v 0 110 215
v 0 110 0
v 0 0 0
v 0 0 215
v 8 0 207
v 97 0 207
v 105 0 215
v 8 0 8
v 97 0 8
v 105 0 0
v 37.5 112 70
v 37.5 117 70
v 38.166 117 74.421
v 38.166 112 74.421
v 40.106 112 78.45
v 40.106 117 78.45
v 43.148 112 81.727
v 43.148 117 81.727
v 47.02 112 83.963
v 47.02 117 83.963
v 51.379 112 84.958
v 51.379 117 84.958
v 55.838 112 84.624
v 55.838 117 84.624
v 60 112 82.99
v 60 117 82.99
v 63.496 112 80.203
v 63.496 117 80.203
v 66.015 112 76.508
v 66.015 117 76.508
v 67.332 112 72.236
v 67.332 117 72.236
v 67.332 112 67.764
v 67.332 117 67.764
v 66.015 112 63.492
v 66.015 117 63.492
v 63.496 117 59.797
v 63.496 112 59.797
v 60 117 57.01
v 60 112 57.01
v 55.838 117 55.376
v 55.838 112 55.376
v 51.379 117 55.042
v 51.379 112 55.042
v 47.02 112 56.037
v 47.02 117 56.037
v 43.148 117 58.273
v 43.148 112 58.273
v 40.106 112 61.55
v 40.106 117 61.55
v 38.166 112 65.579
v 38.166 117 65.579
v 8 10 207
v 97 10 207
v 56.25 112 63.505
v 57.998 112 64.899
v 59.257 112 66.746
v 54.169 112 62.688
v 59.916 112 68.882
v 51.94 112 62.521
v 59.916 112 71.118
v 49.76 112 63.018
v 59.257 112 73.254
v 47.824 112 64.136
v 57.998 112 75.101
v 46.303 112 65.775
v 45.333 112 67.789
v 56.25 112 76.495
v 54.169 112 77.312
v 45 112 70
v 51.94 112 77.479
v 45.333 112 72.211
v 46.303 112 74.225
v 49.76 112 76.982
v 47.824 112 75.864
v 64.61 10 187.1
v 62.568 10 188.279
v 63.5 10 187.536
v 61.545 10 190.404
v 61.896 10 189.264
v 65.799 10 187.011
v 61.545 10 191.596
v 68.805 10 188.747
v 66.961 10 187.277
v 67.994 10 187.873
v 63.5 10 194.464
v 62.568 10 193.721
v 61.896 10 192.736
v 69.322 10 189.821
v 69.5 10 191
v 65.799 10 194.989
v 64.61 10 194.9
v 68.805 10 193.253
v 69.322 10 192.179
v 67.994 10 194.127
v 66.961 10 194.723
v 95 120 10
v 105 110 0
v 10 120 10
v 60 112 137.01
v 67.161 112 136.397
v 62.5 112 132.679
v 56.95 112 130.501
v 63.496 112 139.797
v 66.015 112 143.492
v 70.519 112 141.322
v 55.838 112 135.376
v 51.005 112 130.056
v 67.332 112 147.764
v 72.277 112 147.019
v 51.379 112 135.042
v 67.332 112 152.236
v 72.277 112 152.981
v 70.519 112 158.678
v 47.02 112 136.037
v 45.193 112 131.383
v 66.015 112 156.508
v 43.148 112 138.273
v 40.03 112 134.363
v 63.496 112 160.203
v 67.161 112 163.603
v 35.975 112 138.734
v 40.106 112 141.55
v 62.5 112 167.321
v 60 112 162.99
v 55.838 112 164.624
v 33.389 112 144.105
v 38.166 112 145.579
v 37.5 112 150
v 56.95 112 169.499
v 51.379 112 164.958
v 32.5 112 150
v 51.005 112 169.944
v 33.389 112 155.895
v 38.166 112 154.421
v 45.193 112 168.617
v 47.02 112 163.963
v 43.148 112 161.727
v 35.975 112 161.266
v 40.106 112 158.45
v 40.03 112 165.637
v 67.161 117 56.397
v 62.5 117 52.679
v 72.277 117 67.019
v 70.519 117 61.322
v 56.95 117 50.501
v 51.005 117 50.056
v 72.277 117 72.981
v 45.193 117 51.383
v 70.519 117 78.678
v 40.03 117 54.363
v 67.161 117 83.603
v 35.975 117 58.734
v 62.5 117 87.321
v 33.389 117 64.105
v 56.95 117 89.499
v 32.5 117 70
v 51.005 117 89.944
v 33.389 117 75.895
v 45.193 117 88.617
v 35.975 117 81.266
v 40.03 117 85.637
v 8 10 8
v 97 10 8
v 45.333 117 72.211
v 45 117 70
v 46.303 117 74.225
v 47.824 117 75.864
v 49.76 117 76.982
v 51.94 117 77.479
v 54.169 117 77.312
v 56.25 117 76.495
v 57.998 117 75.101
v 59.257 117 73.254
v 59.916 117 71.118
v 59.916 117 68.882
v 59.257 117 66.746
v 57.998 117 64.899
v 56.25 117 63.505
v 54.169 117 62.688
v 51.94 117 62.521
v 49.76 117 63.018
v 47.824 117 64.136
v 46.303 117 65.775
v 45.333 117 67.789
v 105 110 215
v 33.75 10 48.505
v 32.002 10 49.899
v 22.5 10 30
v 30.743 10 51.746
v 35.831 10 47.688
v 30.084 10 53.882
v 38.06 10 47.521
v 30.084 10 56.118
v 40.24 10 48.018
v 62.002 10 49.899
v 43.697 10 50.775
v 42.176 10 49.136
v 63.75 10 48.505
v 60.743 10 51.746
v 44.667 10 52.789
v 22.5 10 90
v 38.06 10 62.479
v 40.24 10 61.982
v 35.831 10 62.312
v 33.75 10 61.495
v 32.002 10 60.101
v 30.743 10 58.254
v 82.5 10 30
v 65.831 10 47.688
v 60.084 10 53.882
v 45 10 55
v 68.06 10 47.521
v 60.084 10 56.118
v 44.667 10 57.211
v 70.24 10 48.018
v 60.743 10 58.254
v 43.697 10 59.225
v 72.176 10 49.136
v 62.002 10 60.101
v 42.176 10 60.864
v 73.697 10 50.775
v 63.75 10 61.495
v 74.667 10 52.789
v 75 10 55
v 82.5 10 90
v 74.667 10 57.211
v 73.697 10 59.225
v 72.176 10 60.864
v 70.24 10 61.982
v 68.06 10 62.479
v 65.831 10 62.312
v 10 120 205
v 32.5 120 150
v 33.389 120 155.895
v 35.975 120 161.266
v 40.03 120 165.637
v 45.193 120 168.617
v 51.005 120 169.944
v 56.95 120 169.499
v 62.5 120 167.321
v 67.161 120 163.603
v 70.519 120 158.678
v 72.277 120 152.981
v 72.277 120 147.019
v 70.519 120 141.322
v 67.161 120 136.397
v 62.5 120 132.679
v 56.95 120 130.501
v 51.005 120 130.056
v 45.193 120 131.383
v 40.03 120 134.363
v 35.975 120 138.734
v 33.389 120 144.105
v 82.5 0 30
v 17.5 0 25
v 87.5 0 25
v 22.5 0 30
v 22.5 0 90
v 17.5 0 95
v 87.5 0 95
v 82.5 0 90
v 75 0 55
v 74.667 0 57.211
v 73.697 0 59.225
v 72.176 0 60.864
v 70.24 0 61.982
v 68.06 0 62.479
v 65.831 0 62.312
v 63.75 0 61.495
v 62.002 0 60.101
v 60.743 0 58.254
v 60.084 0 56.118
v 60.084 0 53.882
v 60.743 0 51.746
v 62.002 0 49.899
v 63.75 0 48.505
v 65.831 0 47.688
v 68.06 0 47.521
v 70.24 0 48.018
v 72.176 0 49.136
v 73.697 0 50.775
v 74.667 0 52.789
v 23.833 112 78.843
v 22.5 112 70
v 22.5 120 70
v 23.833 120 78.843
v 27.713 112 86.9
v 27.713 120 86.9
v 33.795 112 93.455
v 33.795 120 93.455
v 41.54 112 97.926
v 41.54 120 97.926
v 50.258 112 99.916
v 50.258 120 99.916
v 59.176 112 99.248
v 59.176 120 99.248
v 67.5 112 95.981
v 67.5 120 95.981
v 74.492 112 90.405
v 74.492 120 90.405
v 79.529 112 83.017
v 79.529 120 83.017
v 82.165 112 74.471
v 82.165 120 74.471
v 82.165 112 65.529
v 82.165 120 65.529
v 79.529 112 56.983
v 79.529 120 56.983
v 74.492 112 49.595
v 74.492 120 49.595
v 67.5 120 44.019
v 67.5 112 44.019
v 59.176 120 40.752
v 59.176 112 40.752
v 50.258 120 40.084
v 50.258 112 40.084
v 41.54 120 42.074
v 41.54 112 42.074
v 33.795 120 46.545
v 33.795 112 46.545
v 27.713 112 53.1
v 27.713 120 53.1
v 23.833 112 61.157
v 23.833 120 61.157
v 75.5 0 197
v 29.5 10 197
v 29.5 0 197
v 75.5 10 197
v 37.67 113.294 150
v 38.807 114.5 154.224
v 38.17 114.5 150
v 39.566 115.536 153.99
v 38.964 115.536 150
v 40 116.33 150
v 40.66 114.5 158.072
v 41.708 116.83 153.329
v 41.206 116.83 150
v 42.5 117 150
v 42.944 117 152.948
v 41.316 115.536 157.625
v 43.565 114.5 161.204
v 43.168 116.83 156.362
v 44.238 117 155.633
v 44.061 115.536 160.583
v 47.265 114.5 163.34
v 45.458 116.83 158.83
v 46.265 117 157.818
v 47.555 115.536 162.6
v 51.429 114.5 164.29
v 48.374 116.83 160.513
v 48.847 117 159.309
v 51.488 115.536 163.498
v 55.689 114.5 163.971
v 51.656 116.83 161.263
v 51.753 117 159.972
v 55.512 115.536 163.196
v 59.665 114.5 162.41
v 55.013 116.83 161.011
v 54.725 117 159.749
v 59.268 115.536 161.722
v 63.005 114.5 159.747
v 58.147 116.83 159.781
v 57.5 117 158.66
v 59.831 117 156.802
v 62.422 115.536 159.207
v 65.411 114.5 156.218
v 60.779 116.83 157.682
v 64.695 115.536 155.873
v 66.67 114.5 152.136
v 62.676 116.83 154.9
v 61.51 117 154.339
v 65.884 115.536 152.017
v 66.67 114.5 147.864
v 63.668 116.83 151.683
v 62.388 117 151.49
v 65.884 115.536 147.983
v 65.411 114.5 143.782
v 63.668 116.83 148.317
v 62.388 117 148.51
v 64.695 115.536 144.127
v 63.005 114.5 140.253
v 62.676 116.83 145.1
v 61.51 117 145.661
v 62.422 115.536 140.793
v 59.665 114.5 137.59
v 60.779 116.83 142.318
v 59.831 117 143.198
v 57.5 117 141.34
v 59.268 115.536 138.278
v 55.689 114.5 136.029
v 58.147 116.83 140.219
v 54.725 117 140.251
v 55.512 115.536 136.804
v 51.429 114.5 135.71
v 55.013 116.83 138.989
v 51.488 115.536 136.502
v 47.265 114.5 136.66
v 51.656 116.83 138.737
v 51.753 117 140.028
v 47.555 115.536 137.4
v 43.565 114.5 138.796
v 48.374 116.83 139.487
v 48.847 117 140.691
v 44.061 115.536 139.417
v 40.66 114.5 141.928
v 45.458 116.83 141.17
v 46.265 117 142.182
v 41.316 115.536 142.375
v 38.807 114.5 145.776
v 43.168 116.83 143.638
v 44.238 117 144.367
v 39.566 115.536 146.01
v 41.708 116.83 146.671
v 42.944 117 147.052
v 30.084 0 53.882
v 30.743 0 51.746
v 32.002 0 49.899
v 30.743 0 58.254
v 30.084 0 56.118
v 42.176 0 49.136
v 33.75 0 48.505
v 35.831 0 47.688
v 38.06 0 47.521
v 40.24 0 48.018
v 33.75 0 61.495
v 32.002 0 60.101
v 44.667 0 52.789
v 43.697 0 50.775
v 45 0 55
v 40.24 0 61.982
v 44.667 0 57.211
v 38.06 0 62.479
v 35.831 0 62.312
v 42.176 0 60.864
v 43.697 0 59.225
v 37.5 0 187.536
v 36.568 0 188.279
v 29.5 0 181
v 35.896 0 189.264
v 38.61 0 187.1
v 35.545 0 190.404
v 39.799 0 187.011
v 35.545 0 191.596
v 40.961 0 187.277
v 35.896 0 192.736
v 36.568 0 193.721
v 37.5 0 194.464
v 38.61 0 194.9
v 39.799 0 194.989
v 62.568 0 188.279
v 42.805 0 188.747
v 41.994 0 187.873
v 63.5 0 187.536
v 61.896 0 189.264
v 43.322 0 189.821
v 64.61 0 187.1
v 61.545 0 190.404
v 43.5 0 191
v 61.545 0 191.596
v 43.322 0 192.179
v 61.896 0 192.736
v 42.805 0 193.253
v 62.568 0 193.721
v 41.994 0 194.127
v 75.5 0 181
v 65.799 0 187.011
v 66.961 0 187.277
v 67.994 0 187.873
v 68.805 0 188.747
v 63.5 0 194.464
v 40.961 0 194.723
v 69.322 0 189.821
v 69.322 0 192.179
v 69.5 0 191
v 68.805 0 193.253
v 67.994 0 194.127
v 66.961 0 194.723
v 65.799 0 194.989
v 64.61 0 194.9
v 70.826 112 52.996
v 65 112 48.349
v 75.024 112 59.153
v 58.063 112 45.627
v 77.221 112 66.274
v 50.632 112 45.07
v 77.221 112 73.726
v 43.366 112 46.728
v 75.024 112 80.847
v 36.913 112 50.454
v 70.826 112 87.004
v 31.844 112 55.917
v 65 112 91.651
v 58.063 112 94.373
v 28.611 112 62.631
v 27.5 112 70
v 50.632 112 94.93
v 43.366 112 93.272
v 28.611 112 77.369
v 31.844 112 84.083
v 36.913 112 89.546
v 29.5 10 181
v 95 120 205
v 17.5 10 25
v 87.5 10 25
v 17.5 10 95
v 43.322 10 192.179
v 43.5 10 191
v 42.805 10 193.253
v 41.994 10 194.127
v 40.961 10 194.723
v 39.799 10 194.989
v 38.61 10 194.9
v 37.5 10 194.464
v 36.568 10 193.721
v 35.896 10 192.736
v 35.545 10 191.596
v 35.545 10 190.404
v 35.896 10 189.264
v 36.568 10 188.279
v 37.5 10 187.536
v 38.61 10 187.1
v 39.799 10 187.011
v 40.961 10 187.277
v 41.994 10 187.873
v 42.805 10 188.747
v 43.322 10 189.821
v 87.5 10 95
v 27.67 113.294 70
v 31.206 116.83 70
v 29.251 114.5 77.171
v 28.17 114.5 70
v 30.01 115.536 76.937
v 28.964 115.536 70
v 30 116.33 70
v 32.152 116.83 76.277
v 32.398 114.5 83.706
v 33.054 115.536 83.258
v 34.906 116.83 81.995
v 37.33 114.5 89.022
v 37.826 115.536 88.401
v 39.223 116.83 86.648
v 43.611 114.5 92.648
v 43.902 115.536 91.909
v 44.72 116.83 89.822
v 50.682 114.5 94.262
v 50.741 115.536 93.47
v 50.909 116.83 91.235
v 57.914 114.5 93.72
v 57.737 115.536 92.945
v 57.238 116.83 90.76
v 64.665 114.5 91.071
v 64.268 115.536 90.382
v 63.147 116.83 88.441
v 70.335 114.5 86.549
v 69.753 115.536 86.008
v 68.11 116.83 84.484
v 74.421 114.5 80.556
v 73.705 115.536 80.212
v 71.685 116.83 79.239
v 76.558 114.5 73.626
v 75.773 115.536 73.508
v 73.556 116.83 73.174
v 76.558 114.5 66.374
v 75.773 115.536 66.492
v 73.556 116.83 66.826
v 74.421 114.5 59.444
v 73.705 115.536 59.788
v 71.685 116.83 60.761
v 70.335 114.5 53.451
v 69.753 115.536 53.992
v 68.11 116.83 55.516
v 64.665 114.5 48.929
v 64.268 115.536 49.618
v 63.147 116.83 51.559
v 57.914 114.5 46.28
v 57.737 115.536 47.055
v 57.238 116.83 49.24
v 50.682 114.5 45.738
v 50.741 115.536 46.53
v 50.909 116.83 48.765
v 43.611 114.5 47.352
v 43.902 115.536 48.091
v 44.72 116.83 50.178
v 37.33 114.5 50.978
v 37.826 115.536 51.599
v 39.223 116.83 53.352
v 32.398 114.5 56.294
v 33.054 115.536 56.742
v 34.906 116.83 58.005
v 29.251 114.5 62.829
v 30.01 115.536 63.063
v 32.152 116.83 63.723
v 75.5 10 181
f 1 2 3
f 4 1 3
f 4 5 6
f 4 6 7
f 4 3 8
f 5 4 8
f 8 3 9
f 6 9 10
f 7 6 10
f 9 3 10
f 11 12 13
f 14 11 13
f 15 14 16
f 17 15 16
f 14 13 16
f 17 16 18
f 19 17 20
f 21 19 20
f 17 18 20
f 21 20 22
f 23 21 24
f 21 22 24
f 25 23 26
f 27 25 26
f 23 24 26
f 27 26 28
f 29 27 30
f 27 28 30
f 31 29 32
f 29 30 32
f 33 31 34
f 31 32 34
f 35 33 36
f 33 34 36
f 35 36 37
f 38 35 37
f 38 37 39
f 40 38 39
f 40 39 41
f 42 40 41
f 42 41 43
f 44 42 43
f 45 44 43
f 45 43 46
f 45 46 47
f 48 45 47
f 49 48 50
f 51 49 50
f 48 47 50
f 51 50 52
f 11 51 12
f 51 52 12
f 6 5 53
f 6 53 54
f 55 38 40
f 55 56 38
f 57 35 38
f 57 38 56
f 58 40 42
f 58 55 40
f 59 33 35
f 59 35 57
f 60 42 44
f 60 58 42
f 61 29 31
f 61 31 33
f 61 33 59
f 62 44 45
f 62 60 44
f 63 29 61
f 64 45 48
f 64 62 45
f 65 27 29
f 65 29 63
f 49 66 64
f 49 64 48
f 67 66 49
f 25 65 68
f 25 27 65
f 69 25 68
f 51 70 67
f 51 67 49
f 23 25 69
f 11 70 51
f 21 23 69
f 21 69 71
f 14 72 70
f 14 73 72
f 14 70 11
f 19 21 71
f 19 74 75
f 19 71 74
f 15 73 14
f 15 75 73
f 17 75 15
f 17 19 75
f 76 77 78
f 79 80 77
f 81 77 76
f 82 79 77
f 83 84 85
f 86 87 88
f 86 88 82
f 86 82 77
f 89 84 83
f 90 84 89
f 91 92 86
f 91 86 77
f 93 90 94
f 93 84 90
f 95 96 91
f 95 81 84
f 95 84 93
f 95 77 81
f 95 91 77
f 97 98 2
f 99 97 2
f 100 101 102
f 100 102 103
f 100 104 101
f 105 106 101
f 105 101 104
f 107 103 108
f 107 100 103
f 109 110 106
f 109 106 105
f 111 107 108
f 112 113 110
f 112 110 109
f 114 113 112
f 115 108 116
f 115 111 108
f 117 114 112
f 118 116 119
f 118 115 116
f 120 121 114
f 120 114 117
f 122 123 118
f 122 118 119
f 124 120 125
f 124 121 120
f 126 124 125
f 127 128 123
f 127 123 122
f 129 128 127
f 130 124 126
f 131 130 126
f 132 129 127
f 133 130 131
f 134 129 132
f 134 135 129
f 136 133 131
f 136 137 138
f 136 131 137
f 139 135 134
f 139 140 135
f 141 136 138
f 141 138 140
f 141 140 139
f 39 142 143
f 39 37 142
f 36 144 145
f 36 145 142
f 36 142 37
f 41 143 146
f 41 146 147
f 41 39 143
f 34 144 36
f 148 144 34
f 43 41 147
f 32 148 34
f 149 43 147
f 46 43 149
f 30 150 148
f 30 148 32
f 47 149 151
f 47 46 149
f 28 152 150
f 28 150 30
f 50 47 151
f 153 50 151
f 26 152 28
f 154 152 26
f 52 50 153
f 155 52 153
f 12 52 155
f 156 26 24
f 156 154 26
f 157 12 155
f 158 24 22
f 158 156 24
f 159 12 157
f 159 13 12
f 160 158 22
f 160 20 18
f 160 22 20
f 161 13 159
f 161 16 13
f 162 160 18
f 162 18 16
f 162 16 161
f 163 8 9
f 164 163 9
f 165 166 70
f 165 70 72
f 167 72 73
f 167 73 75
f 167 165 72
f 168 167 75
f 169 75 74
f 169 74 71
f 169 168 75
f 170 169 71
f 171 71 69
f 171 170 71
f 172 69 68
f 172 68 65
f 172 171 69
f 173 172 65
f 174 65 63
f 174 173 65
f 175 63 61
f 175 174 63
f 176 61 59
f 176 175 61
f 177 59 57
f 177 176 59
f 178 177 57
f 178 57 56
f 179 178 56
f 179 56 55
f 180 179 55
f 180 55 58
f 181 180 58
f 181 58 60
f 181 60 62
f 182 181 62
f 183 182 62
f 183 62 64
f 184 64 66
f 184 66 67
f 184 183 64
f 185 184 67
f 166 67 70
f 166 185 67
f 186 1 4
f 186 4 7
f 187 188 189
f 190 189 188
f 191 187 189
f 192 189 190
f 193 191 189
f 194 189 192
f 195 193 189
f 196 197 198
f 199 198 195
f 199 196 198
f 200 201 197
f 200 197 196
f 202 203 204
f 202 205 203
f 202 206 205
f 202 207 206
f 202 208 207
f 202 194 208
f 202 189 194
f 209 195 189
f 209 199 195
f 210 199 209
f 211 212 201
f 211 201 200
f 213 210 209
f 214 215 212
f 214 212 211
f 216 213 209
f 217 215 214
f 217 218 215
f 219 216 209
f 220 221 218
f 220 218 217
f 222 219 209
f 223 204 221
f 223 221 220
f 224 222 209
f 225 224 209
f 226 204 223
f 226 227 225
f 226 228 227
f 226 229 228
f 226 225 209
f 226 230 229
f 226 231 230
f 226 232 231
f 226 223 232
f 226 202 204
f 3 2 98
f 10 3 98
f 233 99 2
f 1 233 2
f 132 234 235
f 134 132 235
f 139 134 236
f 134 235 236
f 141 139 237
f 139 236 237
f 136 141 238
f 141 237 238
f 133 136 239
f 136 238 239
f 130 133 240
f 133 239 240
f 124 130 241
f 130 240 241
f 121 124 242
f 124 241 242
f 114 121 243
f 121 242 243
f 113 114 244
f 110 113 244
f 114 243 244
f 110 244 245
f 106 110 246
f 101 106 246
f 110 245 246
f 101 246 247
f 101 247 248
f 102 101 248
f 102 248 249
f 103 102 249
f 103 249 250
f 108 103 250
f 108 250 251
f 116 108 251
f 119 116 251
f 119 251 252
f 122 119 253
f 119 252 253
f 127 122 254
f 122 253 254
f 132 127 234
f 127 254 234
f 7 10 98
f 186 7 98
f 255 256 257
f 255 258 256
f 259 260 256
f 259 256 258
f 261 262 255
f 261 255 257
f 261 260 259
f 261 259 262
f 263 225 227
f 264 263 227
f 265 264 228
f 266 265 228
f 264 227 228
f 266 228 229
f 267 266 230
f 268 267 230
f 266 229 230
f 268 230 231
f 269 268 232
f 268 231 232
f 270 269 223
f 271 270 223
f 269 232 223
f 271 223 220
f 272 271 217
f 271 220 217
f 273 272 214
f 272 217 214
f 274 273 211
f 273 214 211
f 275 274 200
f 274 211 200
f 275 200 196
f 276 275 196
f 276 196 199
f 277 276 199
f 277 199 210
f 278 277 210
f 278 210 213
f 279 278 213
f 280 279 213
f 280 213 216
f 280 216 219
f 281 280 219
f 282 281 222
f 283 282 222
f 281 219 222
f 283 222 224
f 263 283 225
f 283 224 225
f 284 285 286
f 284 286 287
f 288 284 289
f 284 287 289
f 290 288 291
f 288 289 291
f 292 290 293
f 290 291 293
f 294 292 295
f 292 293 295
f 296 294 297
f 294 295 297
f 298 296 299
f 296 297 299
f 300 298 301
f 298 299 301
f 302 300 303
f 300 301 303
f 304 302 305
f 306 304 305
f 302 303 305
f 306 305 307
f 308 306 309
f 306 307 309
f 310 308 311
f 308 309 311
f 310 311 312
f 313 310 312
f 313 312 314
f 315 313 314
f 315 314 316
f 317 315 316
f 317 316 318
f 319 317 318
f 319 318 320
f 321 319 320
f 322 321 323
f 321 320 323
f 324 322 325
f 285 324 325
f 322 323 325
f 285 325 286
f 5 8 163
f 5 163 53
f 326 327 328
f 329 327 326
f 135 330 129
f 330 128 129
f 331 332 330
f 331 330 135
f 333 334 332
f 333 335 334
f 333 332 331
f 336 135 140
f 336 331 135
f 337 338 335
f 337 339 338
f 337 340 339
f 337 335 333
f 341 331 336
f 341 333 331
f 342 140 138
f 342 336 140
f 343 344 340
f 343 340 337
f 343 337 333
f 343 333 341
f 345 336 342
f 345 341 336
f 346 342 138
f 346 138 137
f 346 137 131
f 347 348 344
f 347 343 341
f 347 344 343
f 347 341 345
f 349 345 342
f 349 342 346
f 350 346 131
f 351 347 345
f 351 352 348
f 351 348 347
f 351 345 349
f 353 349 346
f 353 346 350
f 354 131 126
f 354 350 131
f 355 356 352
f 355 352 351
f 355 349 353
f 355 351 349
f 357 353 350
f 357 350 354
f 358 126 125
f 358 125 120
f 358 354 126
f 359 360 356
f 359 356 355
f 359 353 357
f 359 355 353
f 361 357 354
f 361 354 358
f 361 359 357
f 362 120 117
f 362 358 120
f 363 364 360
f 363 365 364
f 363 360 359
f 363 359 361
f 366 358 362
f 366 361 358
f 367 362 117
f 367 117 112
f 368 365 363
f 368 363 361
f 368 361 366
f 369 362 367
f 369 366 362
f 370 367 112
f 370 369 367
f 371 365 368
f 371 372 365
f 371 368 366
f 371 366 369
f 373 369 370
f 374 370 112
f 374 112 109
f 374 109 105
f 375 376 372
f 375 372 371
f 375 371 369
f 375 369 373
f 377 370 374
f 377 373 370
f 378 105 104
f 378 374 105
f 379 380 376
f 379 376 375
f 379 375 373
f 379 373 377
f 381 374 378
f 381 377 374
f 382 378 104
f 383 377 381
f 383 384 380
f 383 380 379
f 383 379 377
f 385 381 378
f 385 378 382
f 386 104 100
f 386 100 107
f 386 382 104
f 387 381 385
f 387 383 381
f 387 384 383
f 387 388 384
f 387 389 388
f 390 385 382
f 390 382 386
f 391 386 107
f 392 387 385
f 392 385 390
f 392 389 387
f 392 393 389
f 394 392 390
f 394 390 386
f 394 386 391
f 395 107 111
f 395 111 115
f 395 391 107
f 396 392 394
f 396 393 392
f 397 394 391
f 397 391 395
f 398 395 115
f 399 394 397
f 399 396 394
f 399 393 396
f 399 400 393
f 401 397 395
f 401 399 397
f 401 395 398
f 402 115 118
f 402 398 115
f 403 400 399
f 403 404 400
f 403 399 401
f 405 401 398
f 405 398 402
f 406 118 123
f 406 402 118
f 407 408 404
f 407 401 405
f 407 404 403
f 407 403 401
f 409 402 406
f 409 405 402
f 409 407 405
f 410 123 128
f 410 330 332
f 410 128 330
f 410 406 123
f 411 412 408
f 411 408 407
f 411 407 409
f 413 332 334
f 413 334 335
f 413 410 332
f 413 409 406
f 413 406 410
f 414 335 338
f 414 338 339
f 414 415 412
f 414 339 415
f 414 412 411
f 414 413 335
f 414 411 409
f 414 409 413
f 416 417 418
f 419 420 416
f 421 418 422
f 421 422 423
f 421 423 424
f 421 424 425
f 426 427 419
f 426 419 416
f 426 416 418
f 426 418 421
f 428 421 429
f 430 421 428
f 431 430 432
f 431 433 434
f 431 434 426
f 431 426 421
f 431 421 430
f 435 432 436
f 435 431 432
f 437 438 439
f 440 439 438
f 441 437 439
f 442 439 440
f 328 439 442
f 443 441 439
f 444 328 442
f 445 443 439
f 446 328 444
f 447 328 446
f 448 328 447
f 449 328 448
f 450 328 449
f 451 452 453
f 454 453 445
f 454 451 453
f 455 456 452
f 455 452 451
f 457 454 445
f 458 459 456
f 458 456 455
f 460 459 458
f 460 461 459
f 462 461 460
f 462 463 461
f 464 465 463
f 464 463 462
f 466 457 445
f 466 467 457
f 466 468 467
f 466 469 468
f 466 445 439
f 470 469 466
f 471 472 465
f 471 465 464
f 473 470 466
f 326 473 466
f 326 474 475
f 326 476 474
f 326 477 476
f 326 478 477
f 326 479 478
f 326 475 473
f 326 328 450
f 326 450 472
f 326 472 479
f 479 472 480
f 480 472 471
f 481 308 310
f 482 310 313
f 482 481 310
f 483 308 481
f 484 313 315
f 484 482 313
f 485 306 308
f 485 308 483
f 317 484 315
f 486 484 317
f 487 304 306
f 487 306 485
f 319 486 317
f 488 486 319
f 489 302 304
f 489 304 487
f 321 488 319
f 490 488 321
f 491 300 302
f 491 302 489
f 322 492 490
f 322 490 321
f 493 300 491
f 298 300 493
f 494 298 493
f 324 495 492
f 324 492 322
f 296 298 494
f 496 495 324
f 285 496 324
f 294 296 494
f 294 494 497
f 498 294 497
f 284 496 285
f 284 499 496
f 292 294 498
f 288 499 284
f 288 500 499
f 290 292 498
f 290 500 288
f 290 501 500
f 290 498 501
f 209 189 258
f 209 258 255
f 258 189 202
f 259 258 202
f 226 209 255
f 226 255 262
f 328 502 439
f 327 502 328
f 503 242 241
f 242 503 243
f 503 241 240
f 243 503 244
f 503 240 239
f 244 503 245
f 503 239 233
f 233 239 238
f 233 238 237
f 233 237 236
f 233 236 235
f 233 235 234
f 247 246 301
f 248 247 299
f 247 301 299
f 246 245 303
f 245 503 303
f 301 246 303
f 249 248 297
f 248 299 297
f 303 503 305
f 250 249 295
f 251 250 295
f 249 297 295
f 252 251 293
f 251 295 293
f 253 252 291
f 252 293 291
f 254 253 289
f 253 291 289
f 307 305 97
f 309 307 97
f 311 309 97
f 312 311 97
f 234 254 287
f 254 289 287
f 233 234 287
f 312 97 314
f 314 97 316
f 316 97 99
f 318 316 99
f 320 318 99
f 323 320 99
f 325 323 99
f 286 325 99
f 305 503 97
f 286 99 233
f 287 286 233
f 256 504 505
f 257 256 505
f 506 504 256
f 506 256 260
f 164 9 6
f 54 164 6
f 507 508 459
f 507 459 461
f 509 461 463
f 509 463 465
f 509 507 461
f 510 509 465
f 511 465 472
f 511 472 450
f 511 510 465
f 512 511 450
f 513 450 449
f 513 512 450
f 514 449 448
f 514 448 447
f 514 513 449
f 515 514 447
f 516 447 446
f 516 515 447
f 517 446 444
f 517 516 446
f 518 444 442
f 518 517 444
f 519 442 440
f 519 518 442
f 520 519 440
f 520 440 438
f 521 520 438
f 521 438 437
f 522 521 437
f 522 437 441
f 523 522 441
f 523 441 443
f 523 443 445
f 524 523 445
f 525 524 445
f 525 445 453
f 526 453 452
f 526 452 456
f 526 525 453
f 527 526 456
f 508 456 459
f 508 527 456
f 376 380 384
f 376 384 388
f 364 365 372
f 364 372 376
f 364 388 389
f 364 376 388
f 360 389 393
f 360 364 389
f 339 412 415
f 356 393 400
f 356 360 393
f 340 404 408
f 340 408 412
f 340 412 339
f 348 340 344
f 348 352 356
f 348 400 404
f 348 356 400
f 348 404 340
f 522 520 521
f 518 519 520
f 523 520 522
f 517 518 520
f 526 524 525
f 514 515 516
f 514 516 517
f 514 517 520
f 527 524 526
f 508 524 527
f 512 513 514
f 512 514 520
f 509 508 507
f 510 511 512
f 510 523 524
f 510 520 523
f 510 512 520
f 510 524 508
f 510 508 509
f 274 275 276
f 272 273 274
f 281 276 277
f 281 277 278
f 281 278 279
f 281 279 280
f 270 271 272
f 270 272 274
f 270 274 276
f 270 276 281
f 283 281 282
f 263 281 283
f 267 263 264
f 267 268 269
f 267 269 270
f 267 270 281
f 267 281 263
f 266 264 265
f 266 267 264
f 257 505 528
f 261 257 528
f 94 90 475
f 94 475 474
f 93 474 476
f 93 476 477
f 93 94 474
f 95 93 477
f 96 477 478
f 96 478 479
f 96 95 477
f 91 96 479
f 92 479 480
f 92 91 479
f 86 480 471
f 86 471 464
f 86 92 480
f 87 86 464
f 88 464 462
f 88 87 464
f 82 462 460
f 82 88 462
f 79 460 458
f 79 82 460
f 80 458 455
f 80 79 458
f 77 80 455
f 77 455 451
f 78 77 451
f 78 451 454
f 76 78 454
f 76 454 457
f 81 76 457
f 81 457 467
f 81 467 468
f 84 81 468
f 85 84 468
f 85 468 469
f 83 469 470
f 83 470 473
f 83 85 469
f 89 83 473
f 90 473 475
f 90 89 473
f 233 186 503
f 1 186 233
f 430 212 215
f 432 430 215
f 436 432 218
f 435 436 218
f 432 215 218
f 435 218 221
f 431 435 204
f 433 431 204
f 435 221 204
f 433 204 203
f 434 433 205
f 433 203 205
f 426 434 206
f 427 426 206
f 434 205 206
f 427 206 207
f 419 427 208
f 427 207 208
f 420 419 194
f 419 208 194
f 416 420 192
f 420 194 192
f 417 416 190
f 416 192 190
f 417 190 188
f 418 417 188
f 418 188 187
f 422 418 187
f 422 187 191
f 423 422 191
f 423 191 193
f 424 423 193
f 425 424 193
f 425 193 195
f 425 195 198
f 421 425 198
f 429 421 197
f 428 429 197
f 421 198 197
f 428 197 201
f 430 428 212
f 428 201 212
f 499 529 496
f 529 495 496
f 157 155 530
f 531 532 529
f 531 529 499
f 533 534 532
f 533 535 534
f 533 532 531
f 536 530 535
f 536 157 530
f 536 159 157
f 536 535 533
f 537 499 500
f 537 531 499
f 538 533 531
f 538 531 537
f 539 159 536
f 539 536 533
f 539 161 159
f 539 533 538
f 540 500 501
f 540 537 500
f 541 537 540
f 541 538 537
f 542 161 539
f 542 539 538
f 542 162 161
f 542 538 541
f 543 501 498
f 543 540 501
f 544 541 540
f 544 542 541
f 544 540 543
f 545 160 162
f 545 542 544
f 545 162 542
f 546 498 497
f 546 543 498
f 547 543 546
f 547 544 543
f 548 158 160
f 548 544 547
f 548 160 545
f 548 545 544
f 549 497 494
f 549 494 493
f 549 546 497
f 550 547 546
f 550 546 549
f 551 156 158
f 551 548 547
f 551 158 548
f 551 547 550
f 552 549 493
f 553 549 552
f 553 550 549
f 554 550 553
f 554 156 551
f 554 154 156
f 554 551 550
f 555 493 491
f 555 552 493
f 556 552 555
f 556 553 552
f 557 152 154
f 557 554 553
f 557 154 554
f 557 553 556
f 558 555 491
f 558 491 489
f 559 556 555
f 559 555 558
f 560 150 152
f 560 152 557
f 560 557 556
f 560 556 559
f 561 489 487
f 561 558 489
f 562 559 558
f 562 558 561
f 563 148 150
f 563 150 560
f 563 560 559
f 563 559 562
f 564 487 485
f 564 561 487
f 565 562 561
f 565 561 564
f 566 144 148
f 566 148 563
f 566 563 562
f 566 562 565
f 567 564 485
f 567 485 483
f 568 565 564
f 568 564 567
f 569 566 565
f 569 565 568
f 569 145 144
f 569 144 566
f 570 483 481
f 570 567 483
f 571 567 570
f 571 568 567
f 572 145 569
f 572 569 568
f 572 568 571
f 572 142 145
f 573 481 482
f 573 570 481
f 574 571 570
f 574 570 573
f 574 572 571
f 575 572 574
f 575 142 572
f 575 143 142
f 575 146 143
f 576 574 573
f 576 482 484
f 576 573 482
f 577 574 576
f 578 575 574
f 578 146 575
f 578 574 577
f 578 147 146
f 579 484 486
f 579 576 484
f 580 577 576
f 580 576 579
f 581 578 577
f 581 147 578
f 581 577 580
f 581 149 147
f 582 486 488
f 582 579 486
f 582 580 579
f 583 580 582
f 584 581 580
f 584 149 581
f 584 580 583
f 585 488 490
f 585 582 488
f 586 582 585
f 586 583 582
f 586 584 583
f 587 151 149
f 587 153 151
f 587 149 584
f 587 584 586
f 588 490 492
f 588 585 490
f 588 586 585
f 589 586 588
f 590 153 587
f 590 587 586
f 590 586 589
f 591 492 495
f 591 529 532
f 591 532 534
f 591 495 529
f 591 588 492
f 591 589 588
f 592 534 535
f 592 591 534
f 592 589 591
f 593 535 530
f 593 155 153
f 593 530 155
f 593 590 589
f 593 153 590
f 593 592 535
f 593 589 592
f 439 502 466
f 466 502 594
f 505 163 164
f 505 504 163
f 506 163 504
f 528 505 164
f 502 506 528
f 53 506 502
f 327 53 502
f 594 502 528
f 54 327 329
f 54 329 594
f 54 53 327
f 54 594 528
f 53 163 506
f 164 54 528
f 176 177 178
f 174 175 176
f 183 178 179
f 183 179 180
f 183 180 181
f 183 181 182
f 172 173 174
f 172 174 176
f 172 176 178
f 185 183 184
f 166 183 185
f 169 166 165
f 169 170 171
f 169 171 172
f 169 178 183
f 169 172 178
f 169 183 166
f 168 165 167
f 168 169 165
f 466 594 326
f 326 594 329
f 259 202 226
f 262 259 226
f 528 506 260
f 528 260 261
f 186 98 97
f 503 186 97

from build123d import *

# Parameters (mm, degrees)
F1_DEPTH  = 215
F2_SIZE   = 10
F3_R      = 20
F3_R_2    = 30
F4_DEPTH  = 8
F5_R      = 15
F5_R_2    = 25
F6_DEPTH  = 5
F7_R      = 4.99999
F8_R      = 15
F8_R_2    = 7.5
F9_DEPTH  = 5
F10_W     = 89
F10_H     = 199
F11_DEPTH = 10
F12_W     = 46
F12_H     = 16
F12_R     = 4
F13_DEPTH = 10
F14_W     = 70
F14_H     = 70
F14_W_2   = 60
F14_H_2   = 60
F14_R     = 7.5
F15_DEPTH = 10


# Not quite as in the source:
# - a fillet or chamfer is up to 0.001 mm smaller than in the source, because OpenCascade refuses the exact size


with BuildPart() as f1:
    # F0 (on Top) → F1 (new body)
    with BuildSketch(Plane.XY):
        Polygon((0, 110), (0, 0), (105, 0), (105, 110), (95, 120), (10, 120), align=None)
    extrude(amount=F1_DEPTH)

    # F2
    f2_edges = [f1.edges().sort_by_distance(p)[0] for p in [
        (52.5, 120, 215),
        (52.5, 120, 0),
    ]]
    chamfer(f2_edges, length=F2_SIZE)

    # F3 (on face) → F4 (cut)
    with BuildSketch(Plane(origin=(0, 120, 0), x_dir=(-1, 0, 0), z_dir=(0, 1, 0))):
        with Locations((-52.5, 150)):
            Circle(F3_R)
        with Locations((-52.5, 70)):
            Circle(F3_R_2)
    extrude(amount=-F4_DEPTH, mode=Mode.SUBTRACT)

    # F5 (on face) → F6 (join)
    with BuildSketch(Plane(origin=(0, 112, 0), x_dir=(-1, 0, 0), z_dir=(0, 1, 0))):
        with Locations((-52.5, 150)):
            Circle(F5_R)
        with Locations((-52.5, 70)):
            Circle(F5_R_2)
    extrude(amount=F6_DEPTH)

    # F7 (radius 5 in the source; OpenCascade refuses exactly that, so slightly less here)
    f7_edges = [f1.edges().sort_by_distance(p)[0] for p in [
        (77.5, 117, 70),
        (67.5, 117, 150),
    ]]
    fillet(f7_edges, radius=F7_R)

    # F8 (on face) → F9 (cut)
    with BuildSketch(Plane(origin=(0, 117, 0), x_dir=(-1, 0, 0), z_dir=(0, 1, 0))):
        with Locations((-52.5, 70)):
            Circle(F8_R)
        with Locations((-52.5, 70)):
            Circle(F8_R_2, mode=Mode.SUBTRACT)
    extrude(amount=-F9_DEPTH, mode=Mode.SUBTRACT)

    # F10 (on face) → F11 (cut)
    with BuildSketch(Plane.XZ):
        with Locations((52.5, 107.5)):
            Rectangle(F10_W, F10_H)
    extrude(amount=-F11_DEPTH, mode=Mode.SUBTRACT)

    # F12 (on face) → F13 (join)
    with BuildSketch(Plane.XZ.offset(-10)):
        with Locations((52.5, 189)):
            Rectangle(F12_W, F12_H)
        with Locations((39.5, 191)):
            Circle(F12_R, mode=Mode.SUBTRACT)
        with Locations((65.5, 191)):
            Circle(F12_R, mode=Mode.SUBTRACT)
    extrude(amount=F13_DEPTH)

    # F14 (on face) → F15 (join)
    with BuildSketch(Plane.XZ.offset(-10)):
        with Locations((52.5, 60)):
            Rectangle(F14_W, F14_H)
        with Locations((52.5, 60)):
            Rectangle(F14_W_2, F14_H_2, mode=Mode.SUBTRACT)
        with Locations((67.5, 55)):
            Circle(F14_R)
        with Locations((37.5, 55)):
            Circle(F14_R)
    extrude(amount=F15_DEPTH)


solid = f1.part
